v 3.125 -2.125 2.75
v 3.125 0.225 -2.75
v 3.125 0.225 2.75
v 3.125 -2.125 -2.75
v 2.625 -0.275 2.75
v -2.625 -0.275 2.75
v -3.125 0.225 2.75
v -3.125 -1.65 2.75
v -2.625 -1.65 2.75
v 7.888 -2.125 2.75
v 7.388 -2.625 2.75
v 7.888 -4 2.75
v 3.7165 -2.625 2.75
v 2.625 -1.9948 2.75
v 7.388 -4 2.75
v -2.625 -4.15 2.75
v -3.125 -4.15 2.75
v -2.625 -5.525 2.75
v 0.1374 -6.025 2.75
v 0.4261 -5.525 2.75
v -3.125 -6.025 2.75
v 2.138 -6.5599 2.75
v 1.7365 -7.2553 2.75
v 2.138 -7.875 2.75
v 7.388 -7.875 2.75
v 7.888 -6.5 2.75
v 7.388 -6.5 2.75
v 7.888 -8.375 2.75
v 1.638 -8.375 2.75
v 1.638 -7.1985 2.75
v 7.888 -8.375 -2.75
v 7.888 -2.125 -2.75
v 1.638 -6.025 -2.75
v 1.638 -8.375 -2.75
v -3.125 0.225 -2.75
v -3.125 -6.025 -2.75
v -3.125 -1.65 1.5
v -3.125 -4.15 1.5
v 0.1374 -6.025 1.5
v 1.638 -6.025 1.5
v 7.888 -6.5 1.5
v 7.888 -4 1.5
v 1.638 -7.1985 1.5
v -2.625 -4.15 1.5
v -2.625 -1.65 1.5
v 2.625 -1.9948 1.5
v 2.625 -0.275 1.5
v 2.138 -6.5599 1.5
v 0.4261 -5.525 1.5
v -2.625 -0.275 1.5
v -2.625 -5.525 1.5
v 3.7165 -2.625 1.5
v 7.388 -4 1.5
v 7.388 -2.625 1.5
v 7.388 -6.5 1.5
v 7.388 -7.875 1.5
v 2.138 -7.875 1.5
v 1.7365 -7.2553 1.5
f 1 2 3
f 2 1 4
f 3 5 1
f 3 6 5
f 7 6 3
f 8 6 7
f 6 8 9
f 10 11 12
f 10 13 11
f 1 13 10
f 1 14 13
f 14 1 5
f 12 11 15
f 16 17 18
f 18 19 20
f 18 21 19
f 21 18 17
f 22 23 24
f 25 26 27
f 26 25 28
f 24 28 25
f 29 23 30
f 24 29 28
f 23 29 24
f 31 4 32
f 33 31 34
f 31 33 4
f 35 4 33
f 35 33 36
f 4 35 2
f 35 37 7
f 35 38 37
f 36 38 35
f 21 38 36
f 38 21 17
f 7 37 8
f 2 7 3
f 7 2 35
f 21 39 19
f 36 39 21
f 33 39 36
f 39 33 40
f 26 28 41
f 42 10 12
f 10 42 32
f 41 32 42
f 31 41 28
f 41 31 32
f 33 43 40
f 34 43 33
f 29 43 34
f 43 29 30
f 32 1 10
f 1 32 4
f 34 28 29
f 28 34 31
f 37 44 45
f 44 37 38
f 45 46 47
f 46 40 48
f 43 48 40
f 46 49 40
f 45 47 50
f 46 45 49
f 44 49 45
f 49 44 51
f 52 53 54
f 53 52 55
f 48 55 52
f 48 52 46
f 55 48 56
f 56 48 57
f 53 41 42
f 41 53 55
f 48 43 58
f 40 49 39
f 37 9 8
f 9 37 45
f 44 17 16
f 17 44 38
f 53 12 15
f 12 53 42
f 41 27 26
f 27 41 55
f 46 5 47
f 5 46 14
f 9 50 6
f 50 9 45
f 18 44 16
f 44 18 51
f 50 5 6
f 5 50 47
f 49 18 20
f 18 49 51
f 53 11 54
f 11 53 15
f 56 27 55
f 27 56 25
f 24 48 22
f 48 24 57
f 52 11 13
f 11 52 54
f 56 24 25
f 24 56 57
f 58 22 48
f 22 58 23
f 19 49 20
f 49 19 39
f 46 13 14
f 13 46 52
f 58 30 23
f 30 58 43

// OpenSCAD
translate ([0, -2.5, 0]) {
  difference () {
    translate ([0, 0, 0]) {
      difference () {
        union () {
          translate ([0, -0.4, 0]) {
            cube ([6.25, 6.25, 5.5], center=true);
          }
          translate ([4.763, -2.75, 0]) {
            cube ([6.25, 6.25, 5.5], center=true);
          }
        }
      }
    }
    translate ([0, 0, 2.5]) {
      translate ([0, 0, 0]) {
        difference () {
          union () {
            translate ([0, -0.4, 0]) {
              cube ([5.25, 5.25, 2], center=true);
            }
            translate ([4.763, -2.75, 0]) {
              cube ([5.25, 5.25, 2], center=true);
            }
            union () {
              translate ([-2.625, -0.4, 0]) {
                cube ([5.25, 2.5, 2], center=true);
              }
              translate ([7.388, -2.75, 0]) {
                cube ([5.25, 2.5, 2], center=true);
              }
            }
          }
        }
      }
    }
    rotate (a=-30.00000000000001, v=[0, 0, 1]) {
      translate ([2.8815, -0.75, 2.5]) {
        cube ([2, 5, 2], center=true);
      }
    }
  }
}
